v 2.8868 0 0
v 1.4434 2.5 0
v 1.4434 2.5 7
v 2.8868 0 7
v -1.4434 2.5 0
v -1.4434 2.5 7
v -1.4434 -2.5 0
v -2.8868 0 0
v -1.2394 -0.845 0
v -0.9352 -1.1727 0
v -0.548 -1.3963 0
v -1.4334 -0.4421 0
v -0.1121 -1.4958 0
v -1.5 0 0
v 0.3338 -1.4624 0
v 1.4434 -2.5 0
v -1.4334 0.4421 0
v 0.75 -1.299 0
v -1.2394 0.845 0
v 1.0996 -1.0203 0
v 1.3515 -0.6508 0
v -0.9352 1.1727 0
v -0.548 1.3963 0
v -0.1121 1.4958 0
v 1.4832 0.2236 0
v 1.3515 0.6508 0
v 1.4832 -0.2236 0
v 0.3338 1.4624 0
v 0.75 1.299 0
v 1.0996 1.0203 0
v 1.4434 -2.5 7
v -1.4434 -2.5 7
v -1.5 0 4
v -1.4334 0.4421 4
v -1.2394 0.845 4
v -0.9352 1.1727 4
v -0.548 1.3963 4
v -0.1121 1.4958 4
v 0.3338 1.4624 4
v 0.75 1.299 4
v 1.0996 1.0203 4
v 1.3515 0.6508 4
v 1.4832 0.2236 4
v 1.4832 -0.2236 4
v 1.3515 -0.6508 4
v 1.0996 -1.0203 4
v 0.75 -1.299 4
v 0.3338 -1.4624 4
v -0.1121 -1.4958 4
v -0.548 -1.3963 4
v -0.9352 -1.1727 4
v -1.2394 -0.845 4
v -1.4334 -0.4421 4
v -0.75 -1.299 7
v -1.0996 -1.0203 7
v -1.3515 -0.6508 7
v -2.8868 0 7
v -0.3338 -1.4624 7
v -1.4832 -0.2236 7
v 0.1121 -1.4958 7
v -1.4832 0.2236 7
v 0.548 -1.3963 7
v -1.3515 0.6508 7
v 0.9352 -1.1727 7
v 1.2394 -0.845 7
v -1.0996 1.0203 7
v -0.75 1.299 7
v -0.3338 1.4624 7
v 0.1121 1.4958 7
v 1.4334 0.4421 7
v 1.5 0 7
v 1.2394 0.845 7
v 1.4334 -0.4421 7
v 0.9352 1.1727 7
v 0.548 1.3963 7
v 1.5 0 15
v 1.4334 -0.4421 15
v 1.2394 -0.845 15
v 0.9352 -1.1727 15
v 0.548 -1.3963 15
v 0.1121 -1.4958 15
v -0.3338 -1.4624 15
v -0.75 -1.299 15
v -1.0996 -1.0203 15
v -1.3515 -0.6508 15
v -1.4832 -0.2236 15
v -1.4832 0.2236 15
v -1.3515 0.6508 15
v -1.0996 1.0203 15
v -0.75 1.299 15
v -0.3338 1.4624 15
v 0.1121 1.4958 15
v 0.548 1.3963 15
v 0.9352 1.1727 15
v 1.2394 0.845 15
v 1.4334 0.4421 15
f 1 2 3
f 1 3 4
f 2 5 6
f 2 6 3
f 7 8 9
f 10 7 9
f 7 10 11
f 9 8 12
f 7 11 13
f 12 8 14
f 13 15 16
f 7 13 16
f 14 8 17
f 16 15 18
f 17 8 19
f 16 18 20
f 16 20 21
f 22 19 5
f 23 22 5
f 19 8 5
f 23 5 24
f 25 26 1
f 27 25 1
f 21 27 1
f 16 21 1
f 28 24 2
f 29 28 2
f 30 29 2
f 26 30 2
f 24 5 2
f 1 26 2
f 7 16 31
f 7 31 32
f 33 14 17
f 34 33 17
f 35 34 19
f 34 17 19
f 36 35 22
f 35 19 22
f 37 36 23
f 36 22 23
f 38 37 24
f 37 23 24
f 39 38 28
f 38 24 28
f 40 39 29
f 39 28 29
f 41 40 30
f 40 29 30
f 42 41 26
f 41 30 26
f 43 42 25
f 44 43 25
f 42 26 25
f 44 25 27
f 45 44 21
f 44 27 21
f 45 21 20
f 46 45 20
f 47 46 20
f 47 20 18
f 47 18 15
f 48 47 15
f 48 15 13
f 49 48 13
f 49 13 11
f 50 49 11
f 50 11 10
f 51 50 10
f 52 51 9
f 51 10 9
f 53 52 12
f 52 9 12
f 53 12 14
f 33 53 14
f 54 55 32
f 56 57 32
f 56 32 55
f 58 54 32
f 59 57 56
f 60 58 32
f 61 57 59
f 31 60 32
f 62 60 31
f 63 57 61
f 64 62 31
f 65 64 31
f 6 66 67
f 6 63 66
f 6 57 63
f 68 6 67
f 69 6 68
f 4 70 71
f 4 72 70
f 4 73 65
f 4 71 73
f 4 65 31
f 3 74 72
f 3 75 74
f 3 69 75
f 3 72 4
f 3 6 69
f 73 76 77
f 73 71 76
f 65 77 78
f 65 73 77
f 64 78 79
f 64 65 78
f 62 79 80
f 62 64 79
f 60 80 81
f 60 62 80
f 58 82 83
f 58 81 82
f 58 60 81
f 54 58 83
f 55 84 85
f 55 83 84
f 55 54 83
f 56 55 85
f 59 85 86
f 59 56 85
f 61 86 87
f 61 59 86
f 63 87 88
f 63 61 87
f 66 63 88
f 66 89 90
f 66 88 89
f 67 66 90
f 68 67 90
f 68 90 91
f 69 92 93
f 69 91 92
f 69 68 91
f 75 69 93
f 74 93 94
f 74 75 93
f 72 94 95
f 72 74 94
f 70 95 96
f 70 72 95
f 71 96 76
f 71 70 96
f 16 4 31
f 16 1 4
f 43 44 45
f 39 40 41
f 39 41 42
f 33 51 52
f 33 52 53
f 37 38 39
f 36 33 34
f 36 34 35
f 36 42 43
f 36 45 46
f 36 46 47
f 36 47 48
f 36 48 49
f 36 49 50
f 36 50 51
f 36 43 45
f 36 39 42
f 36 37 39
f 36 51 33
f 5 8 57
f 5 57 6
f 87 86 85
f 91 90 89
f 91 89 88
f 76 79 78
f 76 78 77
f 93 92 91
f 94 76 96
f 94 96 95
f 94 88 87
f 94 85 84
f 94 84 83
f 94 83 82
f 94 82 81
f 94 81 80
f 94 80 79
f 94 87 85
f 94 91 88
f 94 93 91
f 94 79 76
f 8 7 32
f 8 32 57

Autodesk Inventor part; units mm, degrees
ref_plane "YZ Plane" through (0, 0, 0) normal (1, 0, 0) x (0, 1, 0)
ref_plane "XZ Plane" through (0, 0, 0) normal (0, 1, 0) x (-1, 0, 0)
ref_plane "XY Plane" through (0, 0, 0) normal (0, 0, 1) x (1, 0, 0)
sketch "Sketch1" plane through (0, 0, 0) normal (0, 0, 1) x (1, 0, 0)
  line L0 (2.8868, 0) -> (1.4434, -2.5)
  line L1 (1.4434, -2.5) -> (-1.4434, -2.5)
  line L2 (-1.4434, -2.5) -> (-2.8868, 0)
  line L3 (-2.8868, 0) -> (-1.4434, 2.5)
  line L4 (-1.4434, 2.5) -> (1.4434, 2.5)
  line L5 (1.4434, 2.5) -> (2.8868, 0)
  point P0 (0, 0)
  point P1 (0, 0)
  dimension "d0" = 5
extrude "Extrusion1" add sketch "Sketch1" along normal blind 7
sketch "Sketch2" plane through (0, 0, 7) normal (0, 0, 1) x (1, 0, 0)
  circle A0 centre (0, 0) radius 1.5
  dimension "d3" = 3
extrude "Extrusion2" add sketch "Sketch2" along normal blind 8
sketch "Sketch3" plane through (0, 0, 0) normal (0, 0, -1) x (-1, 0, 0)
  circle A0 centre (0, 0) radius 1.5
  dimension "d6" = 3
extrude "Extrusion3" cut sketch "Sketch3" against normal blind 4
properties part number "Spacer7mm_m3"
